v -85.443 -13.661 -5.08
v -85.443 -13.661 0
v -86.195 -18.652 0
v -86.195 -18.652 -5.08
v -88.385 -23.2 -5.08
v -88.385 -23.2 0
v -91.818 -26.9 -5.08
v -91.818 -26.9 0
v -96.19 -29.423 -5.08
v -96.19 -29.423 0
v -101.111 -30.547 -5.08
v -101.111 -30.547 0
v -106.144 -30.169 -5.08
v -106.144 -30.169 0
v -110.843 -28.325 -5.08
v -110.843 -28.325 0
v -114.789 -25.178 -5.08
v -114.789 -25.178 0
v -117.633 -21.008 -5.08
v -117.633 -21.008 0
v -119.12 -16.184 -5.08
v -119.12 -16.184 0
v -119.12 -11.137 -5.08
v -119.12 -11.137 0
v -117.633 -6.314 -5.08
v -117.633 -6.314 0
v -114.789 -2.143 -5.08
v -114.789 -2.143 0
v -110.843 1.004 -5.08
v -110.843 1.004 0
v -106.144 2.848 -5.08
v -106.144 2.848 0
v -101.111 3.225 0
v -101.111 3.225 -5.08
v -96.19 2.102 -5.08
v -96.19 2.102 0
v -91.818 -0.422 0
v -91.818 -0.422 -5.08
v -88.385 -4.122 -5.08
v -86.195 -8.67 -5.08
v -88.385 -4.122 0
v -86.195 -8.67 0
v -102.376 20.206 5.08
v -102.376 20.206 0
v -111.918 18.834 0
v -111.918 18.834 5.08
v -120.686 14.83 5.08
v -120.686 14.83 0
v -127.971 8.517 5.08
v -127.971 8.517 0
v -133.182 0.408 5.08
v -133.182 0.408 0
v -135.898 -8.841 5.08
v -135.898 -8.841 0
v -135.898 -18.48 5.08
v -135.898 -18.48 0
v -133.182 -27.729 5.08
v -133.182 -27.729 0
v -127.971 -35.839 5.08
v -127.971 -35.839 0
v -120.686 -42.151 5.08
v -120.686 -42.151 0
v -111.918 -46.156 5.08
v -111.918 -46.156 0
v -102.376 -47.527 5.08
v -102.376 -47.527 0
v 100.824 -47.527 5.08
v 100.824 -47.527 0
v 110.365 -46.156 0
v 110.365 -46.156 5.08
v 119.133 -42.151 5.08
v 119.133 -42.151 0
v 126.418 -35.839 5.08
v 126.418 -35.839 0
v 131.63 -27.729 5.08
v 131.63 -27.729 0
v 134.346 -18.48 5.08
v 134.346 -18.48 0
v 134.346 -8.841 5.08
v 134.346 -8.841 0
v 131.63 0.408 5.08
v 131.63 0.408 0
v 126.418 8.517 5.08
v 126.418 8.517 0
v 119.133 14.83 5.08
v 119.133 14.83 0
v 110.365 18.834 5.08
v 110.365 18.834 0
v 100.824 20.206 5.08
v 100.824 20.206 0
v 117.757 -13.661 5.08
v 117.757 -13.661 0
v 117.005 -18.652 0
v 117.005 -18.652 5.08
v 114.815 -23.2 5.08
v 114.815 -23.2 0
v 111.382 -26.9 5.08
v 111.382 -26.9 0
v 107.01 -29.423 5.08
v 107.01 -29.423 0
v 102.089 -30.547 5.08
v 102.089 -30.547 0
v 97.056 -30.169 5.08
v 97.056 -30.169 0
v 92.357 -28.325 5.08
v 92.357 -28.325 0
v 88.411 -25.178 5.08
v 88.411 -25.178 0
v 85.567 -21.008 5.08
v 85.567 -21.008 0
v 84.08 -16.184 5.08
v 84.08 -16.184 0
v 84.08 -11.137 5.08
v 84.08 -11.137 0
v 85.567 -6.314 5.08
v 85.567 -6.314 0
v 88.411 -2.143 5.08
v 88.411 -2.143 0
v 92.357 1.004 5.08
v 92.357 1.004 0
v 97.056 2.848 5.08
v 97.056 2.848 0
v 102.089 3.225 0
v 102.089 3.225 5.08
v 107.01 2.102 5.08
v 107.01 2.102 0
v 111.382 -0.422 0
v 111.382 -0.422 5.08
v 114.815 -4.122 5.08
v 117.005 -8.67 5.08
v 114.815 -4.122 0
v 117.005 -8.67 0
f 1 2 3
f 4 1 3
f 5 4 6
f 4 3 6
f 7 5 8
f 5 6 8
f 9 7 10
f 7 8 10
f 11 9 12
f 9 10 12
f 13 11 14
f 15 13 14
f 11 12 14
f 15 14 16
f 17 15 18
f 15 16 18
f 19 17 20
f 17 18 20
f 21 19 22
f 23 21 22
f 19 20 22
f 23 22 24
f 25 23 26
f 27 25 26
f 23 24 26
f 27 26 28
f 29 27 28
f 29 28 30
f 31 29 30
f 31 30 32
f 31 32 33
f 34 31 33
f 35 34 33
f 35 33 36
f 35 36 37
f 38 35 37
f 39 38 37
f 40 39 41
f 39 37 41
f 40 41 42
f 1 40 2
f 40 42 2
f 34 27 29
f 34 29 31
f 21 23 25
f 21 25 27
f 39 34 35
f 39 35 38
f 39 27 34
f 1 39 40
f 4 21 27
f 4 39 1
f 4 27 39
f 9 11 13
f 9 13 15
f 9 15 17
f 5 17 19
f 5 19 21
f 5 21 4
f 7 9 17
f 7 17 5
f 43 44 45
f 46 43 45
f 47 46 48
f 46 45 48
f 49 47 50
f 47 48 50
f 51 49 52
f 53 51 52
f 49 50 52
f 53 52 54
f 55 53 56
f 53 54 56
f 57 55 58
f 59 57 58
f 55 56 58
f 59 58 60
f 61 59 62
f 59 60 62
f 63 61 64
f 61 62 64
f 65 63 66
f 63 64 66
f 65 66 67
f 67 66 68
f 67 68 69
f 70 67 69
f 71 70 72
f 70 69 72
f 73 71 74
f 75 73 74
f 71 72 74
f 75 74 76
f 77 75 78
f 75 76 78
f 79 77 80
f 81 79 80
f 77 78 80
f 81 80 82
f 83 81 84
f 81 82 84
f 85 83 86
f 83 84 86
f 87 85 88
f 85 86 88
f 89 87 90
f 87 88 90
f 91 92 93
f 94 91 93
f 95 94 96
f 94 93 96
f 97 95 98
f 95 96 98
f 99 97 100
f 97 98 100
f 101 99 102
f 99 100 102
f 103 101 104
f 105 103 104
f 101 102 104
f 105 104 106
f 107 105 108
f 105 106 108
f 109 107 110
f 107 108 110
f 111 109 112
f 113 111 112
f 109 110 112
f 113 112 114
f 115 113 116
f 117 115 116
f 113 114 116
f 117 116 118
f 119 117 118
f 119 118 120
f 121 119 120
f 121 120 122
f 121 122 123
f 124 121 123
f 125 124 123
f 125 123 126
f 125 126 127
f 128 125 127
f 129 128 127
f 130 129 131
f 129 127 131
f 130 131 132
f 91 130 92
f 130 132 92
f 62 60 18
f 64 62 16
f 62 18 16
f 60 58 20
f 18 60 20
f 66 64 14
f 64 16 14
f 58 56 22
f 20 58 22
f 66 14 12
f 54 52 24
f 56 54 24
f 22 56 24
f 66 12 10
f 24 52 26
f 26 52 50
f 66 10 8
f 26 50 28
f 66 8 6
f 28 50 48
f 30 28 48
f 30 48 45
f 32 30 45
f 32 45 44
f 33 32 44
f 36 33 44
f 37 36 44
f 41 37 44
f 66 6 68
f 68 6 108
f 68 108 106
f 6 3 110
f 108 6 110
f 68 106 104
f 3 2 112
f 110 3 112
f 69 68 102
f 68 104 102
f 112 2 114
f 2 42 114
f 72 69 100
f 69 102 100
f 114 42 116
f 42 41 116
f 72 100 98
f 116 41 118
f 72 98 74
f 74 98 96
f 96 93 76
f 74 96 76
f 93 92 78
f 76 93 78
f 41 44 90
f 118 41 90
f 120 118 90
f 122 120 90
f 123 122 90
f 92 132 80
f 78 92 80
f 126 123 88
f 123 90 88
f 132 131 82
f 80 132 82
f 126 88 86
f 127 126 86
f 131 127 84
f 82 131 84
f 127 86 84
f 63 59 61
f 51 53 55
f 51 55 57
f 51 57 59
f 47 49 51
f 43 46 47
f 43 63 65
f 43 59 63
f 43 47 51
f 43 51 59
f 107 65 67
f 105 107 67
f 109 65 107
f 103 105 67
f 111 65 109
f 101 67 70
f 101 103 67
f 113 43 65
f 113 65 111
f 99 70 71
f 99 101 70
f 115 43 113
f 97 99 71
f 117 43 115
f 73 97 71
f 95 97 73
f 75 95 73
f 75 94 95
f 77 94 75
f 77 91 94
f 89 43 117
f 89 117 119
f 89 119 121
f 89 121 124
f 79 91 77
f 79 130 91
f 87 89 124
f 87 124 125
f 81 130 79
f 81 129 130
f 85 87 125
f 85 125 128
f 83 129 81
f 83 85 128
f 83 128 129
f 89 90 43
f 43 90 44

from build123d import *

# Parameters (mm, degrees)
F2_DEPTH = 5.08
F3_R     = 16.9333333333
F4_DEPTH = 5.08
F5_DEPTH = 5.08


# Not quite as in the source:
# - a variable given as a bare number and used for a length is read in inches; the dataset says mm whatever the document's units were


with BuildPart() as f2:
    # F1 (on Top) → F2 (new body)
    with BuildSketch(Plane.XY):
        with BuildLine():
            ThreePointArc((100.8237705737, -47.527355603), (134.6904372404, -13.6606889364), (100.8237705737, 20.2059777303))
            Line((100.8237705737, 20.2059777303), (-102.3762294263, 20.2059777303))
            ThreePointArc((-102.3762294263, 20.2059777303), (-136.2428960929, -13.6606889364), (-102.3762294263, -47.527355603))
            Line((-102.3762294263, -47.527355603), (100.8237705737, -47.527355603))
        make_face()
    extrude(amount=F2_DEPTH)

    # F3 (on face) → F4 (join)
    with BuildSketch(Plane(origin=(0, 0, 0), x_dir=(1, 0, 0), z_dir=(0, 0, -1))):
        with Locations((-102.3762294263, 13.6606889364)):
            Circle(F3_R)
    extrude(amount=F4_DEPTH)

    # F3 (on face) → F5 (cut)
    with BuildSketch(Plane(origin=(0, 0, 0), x_dir=(1, 0, 0), z_dir=(0, 0, -1))):
        with Locations((100.8237705737, 13.6606889364)):
            Circle(F3_R)
    extrude(amount=-F5_DEPTH, mode=Mode.SUBTRACT)


solid = f2.part
